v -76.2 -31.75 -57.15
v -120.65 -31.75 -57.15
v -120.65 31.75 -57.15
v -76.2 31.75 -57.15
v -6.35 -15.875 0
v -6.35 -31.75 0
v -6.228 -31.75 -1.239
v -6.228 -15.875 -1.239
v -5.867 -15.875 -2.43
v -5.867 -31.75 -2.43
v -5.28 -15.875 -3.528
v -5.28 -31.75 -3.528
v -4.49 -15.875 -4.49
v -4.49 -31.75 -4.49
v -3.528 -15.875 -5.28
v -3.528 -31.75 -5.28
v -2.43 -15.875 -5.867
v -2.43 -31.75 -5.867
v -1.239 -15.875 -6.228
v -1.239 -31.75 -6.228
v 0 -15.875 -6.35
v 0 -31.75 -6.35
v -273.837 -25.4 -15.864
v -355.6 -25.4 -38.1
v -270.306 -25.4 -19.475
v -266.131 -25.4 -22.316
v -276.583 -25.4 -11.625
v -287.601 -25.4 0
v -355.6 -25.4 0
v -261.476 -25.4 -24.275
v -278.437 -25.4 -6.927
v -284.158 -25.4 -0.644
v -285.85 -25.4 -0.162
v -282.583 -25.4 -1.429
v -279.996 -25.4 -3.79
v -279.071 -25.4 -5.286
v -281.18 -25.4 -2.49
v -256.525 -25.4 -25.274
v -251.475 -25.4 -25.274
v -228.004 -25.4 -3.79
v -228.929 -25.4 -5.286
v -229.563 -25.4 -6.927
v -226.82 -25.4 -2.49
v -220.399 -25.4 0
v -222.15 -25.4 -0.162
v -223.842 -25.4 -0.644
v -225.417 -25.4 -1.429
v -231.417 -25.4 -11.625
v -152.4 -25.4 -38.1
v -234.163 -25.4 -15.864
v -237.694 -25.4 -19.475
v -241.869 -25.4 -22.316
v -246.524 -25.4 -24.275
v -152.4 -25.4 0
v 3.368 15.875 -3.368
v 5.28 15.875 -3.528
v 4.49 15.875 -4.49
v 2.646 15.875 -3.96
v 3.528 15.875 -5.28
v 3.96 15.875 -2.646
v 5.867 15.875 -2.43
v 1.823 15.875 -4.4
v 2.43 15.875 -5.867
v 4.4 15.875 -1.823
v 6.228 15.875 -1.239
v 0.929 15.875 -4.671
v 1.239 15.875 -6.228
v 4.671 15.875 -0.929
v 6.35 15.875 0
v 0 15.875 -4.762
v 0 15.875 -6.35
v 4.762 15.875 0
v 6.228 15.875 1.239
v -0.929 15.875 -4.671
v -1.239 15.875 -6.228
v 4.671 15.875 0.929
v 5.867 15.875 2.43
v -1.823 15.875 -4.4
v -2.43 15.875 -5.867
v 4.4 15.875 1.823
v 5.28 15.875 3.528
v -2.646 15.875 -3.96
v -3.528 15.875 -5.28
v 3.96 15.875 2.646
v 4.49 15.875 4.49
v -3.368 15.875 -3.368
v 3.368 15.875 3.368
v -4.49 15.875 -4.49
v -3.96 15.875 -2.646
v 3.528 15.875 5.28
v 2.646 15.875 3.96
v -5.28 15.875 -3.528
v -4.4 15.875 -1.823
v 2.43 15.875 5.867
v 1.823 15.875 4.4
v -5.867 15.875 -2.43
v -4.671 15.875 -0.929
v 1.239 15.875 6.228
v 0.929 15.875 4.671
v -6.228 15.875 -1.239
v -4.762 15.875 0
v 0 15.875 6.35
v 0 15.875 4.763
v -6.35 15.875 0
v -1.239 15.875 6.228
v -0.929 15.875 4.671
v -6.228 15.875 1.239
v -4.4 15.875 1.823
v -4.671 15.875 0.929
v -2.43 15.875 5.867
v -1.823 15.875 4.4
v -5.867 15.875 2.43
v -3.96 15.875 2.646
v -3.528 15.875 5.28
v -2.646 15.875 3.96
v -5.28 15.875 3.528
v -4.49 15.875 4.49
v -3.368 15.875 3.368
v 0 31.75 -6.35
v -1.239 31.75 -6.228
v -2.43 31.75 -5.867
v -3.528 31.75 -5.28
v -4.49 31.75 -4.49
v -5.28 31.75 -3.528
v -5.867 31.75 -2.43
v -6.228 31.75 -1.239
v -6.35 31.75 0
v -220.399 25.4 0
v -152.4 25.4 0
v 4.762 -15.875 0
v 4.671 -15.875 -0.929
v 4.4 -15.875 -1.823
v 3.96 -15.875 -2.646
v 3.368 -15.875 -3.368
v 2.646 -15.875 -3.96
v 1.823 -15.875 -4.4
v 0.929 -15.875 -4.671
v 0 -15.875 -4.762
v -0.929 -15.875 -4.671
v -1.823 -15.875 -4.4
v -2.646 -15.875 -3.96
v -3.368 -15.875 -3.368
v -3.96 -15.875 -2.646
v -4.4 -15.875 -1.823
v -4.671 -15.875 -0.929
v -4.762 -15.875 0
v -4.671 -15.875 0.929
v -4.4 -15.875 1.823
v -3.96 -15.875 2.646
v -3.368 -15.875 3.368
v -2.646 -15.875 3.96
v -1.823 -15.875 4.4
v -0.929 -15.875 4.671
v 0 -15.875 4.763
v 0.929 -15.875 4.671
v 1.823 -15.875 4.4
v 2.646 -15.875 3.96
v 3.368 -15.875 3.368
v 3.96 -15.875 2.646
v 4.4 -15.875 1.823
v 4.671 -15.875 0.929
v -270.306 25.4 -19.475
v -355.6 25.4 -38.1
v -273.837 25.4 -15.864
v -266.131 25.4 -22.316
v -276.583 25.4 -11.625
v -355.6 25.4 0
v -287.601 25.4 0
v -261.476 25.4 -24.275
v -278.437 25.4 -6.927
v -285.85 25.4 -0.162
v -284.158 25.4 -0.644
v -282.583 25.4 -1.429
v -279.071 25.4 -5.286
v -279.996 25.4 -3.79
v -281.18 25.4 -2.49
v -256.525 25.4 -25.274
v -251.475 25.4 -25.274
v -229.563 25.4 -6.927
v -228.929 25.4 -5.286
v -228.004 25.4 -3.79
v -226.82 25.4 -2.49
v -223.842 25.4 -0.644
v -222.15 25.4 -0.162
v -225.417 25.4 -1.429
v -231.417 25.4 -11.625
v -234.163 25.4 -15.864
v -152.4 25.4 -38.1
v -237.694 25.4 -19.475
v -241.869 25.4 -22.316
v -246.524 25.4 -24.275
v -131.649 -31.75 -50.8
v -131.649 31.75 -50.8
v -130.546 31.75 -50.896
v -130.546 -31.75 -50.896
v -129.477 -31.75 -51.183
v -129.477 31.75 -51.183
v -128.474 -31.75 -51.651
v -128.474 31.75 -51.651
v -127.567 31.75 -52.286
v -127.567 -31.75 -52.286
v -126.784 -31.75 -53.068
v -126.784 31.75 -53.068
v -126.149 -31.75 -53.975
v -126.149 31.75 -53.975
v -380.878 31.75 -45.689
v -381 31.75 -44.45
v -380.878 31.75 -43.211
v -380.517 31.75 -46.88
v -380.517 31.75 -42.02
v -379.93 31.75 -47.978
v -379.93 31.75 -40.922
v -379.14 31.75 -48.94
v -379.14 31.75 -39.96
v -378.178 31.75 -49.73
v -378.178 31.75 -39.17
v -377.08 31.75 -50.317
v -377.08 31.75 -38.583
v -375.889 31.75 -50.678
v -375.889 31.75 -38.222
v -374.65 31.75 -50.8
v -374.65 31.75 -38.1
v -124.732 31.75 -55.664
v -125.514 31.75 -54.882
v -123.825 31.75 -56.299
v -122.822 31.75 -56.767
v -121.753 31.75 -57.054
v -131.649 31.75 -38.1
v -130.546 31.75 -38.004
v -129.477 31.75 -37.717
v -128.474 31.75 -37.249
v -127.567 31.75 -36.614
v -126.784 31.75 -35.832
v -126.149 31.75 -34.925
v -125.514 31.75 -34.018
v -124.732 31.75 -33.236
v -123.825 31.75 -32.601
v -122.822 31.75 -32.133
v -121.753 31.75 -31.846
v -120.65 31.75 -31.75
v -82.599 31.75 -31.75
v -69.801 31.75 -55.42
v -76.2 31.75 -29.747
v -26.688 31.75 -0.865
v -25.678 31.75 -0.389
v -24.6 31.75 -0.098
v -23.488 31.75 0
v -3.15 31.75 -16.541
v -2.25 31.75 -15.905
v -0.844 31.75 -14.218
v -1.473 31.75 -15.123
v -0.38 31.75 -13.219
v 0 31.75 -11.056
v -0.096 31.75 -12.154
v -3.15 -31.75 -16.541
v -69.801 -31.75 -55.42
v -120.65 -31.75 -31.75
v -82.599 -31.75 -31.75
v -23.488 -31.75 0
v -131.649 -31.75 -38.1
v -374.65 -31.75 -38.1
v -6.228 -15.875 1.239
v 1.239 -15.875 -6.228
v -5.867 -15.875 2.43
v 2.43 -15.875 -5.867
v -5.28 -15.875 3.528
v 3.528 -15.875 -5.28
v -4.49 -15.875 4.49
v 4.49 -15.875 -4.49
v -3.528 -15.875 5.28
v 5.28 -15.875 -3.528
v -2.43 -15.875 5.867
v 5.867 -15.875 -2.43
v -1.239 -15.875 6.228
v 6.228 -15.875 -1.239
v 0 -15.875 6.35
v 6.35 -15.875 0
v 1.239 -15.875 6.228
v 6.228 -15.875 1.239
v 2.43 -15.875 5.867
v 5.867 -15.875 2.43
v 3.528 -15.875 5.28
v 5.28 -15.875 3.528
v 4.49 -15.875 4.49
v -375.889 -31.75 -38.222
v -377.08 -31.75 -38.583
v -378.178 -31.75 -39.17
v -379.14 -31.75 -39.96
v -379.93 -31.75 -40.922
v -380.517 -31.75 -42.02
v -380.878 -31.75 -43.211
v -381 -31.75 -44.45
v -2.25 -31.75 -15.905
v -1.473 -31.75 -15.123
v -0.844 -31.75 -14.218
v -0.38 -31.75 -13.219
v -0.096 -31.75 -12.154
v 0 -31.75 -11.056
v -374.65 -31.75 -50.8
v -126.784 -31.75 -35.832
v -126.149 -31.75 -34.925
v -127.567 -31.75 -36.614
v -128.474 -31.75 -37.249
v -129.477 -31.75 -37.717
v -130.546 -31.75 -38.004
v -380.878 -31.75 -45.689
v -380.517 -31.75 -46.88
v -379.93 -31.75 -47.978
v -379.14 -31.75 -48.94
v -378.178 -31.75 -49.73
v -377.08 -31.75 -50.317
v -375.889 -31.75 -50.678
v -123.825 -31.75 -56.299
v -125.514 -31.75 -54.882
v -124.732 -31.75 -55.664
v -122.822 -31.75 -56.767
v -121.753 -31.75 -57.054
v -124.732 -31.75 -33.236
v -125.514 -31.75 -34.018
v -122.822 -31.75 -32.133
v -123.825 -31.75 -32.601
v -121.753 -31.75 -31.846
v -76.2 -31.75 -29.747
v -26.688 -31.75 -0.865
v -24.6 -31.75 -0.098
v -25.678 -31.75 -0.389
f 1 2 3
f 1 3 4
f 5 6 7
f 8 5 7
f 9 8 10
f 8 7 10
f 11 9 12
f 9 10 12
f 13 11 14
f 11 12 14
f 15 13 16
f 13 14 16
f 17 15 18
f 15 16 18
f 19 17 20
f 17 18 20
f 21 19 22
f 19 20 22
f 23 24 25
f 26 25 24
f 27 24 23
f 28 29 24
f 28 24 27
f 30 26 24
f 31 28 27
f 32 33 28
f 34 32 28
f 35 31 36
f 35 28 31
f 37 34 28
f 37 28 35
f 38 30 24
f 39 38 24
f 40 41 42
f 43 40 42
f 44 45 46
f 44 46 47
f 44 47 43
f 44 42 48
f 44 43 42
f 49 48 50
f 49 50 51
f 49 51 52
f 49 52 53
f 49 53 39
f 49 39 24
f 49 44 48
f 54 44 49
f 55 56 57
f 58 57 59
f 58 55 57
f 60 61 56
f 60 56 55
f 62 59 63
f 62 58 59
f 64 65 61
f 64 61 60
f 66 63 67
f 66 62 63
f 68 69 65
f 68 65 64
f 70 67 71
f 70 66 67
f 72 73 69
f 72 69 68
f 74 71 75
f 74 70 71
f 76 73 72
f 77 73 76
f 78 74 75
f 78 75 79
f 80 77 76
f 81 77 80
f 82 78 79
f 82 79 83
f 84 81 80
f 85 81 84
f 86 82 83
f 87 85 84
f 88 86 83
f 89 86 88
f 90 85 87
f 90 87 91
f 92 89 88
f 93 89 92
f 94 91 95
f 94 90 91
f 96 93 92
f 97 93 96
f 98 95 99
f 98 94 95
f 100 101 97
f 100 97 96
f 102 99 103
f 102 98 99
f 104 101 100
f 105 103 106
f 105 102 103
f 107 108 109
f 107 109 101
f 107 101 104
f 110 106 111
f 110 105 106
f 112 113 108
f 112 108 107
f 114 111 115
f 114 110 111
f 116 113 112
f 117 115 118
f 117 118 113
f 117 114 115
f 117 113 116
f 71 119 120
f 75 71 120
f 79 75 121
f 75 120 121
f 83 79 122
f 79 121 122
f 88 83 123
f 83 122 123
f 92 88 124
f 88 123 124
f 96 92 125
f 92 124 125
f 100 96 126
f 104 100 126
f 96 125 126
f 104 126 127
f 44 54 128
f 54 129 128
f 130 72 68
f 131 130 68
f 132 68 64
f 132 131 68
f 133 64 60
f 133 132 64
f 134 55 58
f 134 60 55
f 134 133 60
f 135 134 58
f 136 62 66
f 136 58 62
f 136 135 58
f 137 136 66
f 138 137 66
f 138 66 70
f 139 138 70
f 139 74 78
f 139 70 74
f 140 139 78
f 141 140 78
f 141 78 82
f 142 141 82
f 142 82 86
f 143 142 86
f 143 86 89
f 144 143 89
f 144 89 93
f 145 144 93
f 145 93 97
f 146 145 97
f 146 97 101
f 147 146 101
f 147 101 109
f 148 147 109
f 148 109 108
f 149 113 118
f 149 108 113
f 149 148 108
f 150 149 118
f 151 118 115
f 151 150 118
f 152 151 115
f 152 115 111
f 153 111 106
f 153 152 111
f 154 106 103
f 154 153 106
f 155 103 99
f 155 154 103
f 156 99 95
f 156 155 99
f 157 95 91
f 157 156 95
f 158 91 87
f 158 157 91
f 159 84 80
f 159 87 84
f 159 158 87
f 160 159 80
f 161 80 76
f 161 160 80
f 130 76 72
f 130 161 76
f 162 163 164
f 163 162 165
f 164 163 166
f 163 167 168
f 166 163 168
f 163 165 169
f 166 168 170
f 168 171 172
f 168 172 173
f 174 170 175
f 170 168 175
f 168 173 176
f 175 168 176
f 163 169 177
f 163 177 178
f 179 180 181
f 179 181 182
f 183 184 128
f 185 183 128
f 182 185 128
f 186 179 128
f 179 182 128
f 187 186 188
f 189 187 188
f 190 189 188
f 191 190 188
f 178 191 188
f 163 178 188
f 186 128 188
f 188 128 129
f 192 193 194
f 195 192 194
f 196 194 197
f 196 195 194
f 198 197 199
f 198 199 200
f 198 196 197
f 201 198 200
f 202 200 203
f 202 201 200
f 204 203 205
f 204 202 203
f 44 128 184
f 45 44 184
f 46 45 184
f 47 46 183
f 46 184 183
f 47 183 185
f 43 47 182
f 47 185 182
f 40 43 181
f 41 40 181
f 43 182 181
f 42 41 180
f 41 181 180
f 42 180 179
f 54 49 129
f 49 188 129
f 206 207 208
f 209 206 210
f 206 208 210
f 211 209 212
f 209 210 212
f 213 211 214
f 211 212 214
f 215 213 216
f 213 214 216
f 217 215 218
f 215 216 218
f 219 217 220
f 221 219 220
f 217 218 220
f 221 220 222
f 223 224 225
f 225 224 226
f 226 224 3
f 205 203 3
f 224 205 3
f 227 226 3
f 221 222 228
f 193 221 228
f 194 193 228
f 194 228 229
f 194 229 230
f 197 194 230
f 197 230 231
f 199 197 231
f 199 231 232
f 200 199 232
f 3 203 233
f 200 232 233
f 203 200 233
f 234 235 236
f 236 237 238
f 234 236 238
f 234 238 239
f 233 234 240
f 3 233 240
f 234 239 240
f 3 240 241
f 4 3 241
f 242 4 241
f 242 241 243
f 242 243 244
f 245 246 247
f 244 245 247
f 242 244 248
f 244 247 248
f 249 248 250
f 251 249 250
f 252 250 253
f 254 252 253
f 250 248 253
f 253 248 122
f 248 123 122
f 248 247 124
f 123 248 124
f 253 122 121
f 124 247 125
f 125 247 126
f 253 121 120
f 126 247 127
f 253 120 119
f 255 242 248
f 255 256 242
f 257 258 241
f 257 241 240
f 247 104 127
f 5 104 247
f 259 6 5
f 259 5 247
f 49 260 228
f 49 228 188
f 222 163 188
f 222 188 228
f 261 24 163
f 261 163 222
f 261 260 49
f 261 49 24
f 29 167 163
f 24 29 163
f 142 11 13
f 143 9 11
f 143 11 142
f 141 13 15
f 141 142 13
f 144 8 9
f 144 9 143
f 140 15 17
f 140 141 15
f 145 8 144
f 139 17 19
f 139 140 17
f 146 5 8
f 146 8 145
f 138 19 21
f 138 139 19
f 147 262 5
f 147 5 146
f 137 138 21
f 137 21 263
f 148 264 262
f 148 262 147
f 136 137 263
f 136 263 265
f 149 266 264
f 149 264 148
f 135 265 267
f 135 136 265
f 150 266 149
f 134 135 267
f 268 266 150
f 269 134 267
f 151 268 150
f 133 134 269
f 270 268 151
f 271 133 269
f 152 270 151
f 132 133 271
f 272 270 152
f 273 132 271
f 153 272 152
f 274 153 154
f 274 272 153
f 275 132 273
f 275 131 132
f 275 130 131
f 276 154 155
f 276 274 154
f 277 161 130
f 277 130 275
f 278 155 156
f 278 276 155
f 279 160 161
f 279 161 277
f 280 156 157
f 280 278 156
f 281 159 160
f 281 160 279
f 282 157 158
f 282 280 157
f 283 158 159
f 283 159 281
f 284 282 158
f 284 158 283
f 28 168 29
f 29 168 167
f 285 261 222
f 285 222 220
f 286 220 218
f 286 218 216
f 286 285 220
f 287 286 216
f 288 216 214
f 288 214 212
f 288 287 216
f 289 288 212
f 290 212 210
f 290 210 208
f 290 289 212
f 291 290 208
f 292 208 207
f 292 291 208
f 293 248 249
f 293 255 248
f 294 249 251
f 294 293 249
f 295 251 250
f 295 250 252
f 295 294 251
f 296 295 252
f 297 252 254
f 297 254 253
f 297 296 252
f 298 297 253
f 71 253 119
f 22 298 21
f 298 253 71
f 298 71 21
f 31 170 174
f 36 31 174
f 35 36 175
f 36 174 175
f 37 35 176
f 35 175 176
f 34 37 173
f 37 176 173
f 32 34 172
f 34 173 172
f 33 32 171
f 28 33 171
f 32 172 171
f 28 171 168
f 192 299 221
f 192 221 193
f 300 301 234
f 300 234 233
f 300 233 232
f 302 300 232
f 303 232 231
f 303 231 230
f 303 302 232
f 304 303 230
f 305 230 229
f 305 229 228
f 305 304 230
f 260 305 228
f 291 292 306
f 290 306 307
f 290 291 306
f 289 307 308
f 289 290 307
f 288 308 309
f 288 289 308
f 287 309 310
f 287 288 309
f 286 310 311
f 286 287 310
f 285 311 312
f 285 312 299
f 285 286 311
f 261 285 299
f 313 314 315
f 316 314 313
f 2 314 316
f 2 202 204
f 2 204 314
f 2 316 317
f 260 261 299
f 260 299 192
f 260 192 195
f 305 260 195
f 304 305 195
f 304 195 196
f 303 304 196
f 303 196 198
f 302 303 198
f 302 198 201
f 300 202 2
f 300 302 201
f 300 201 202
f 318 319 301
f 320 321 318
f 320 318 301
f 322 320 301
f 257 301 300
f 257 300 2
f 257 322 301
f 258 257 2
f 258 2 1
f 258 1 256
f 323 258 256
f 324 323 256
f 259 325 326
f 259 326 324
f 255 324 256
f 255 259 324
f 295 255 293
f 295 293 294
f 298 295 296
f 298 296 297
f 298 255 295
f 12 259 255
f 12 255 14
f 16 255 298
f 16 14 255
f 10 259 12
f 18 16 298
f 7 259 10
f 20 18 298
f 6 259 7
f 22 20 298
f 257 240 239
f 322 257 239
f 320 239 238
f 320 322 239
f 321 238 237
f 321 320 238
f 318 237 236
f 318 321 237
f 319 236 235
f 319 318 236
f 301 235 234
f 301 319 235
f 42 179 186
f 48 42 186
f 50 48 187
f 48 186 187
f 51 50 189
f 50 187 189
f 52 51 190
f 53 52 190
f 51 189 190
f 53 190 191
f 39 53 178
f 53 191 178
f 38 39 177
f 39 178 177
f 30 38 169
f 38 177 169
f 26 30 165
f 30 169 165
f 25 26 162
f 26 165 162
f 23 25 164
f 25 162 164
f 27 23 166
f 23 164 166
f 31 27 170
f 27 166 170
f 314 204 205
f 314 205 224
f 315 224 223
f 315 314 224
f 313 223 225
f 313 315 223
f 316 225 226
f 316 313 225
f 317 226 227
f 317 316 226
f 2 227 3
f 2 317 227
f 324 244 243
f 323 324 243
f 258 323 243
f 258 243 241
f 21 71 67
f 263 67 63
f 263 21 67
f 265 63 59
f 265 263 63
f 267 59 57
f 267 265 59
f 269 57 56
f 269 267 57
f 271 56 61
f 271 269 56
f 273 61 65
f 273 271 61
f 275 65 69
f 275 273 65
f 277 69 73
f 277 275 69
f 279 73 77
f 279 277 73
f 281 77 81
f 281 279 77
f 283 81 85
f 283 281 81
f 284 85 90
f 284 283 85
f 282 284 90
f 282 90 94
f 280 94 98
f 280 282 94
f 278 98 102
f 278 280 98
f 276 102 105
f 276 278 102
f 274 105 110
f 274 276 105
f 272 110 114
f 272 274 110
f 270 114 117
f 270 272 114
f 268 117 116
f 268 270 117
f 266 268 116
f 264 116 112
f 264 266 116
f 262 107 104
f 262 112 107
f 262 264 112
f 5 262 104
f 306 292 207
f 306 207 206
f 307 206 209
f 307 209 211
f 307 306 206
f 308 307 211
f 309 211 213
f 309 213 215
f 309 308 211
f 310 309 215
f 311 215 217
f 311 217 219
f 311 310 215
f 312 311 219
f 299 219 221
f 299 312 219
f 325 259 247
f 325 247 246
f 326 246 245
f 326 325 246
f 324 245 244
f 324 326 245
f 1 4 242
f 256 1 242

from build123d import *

# Parameters (mm, degrees)
F1_DEPTH      = 31.75
F1_DEPTH_BACK = 31.75
F2_DEPTH      = 25.4
F2_DEPTH_BACK = 25.4
F3_R          = 6.35
F4_DEPTH      = 15.875
F5_R          = 6.35
F6_DEPTH      = 15.875


with BuildPart() as f1:
    # F0 (on Front) → F1 (new body, two sides)
    with BuildSketch(Plane.XZ) as f1_sk:
        with BuildLine():
            Line((0, -11.055585), (0, -6.35))
            ThreePointArc((0, -6.35), (4.490128, 4.490128), (-6.35, 0))
            Line((-6.35, 0), (-23.488146, 0))
            ThreePointArc((-23.488146, 0), (-25.145368, -0.220064), (-26.687727, -0.865004))
            Line((-26.687727, -0.865004), (-76.2, -29.747163))
            Line((-76.2, -29.747163), (-82.599162, -31.75))
            Line((-82.599162, -31.75), (-120.65, -31.75))
            ThreePointArc((-120.65, -31.75), (-123.825, -32.600739), (-126.149261, -34.925))
            ThreePointArc((-126.149261, -34.925), (-128.473523, -37.249261), (-131.648523, -38.1))
            Line((-131.648523, -38.1), (-152.4, -38.1))
            Line((-152.4, -38.1), (-355.6, -38.1))
            Line((-355.6, -38.1), (-374.65, -38.1))
            ThreePointArc((-374.65, -38.1), (-379.140128, -39.959872), (-381, -44.45))
            ThreePointArc((-381, -44.45), (-379.140128, -48.940128), (-374.65, -50.8))
            Line((-374.65, -50.8), (-131.648523, -50.8))
            ThreePointArc((-131.648523, -50.8), (-128.473523, -51.650739), (-126.149261, -53.975))
            ThreePointArc((-126.149261, -53.975), (-123.825, -56.299261), (-120.65, -57.15))
            Line((-120.65, -57.15), (-76.2, -57.15))
            Line((-76.2, -57.15), (-69.800838, -55.419992))
            Line((-69.800838, -55.419992), (-3.150419, -16.540581))
            ThreePointArc((-3.150419, -16.540581), (-0.843647, -14.218271), (0, -11.055585))
        make_face()
        with BuildLine():
            ThreePointArc((-4.7625, 0), (0, 4.7625), (4.7625, 0))
            ThreePointArc((4.7625, 0), (0, -4.7625), (-4.7625, 0))
        make_face(mode=Mode.SUBTRACT)
    extrude(amount=F1_DEPTH)
    extrude(f1_sk.sketch, amount=-F1_DEPTH_BACK)

    # F0 (on Front) → F2 (join, two sides)
    with BuildSketch(Plane.XZ) as f2_sk:
        with BuildLine():
            ThreePointArc((-4.7625, 0), (0, -4.7625), (4.7625, 0))
            ThreePointArc((4.7625, 0), (0, 4.7625), (-4.7625, 0))
        make_face()
        with BuildLine():
            Line((0, -11.055585), (0, -6.35))
            ThreePointArc((0, -6.35), (4.490128, 4.490128), (-6.35, 0))
            Line((-6.35, 0), (-23.488146, 0))
            ThreePointArc((-23.488146, 0), (-25.145368, -0.220064), (-26.687727, -0.865004))
            Line((-26.687727, -0.865004), (-76.2, -29.747163))
            Line((-76.2, -29.747163), (-82.599162, -31.75))
            Line((-82.599162, -31.75), (-120.65, -31.75))
            ThreePointArc((-120.65, -31.75), (-123.825, -32.600739), (-126.149261, -34.925))
            ThreePointArc((-126.149261, -34.925), (-128.473523, -37.249261), (-131.648523, -38.1))
            Line((-131.648523, -38.1), (-152.4, -38.1))
            Line((-152.4, -38.1), (-355.6, -38.1))
            Line((-355.6, -38.1), (-374.65, -38.1))
            ThreePointArc((-374.65, -38.1), (-379.140128, -39.959872), (-381, -44.45))
            ThreePointArc((-381, -44.45), (-379.140128, -48.940128), (-374.65, -50.8))
            Line((-374.65, -50.8), (-131.648523, -50.8))
            ThreePointArc((-131.648523, -50.8), (-128.473523, -51.650739), (-126.149261, -53.975))
            ThreePointArc((-126.149261, -53.975), (-123.825, -56.299261), (-120.65, -57.15))
            Line((-120.65, -57.15), (-76.2, -57.15))
            Line((-76.2, -57.15), (-69.800838, -55.419992))
            Line((-69.800838, -55.419992), (-3.150419, -16.540581))
            ThreePointArc((-3.150419, -16.540581), (-0.843647, -14.218271), (0, -11.055585))
        make_face()
        with BuildLine():
            ThreePointArc((-4.7625, 0), (0, 4.7625), (4.7625, 0))
            ThreePointArc((4.7625, 0), (0, -4.7625), (-4.7625, 0))
        make_face(mode=Mode.SUBTRACT)
        with BuildLine():
            Line((-355.6, -38.1), (-152.4, -38.1))
            Line((-152.4, -38.1), (-152.4, 0))
            Line((-152.4, 0), (-220.398958, 0))
            ThreePointArc((-220.398958, 0), (-226.142749, -1.926679), (-229.562879, -6.927273))
            ThreePointArc((-229.562879, -6.927273), (-254, -25.4), (-278.437121, -6.927273))
            ThreePointArc((-278.437121, -6.927273), (-281.857251, -1.926679), (-287.601042, 0))
            Line((-287.601042, 0), (-355.6, 0))
            Line((-355.6, 0), (-355.6, -38.1))
        make_face()
    extrude(amount=F2_DEPTH)
    extrude(f2_sk.sketch, amount=-F2_DEPTH_BACK)

    # F3 (on face) → F4 (cut)
    with BuildSketch(Plane(origin=(0, 31.75, 0), x_dir=(-1, 0, 0), z_dir=(0, 1, 0))):
        Circle(F3_R)
    extrude(amount=-F4_DEPTH, mode=Mode.SUBTRACT)

    # F5 (on face) → F6 (cut)
    with BuildSketch(Plane.XZ.offset(31.75)):
        Circle(F5_R)
    extrude(amount=-F6_DEPTH, mode=Mode.SUBTRACT)


solid = f1.part
